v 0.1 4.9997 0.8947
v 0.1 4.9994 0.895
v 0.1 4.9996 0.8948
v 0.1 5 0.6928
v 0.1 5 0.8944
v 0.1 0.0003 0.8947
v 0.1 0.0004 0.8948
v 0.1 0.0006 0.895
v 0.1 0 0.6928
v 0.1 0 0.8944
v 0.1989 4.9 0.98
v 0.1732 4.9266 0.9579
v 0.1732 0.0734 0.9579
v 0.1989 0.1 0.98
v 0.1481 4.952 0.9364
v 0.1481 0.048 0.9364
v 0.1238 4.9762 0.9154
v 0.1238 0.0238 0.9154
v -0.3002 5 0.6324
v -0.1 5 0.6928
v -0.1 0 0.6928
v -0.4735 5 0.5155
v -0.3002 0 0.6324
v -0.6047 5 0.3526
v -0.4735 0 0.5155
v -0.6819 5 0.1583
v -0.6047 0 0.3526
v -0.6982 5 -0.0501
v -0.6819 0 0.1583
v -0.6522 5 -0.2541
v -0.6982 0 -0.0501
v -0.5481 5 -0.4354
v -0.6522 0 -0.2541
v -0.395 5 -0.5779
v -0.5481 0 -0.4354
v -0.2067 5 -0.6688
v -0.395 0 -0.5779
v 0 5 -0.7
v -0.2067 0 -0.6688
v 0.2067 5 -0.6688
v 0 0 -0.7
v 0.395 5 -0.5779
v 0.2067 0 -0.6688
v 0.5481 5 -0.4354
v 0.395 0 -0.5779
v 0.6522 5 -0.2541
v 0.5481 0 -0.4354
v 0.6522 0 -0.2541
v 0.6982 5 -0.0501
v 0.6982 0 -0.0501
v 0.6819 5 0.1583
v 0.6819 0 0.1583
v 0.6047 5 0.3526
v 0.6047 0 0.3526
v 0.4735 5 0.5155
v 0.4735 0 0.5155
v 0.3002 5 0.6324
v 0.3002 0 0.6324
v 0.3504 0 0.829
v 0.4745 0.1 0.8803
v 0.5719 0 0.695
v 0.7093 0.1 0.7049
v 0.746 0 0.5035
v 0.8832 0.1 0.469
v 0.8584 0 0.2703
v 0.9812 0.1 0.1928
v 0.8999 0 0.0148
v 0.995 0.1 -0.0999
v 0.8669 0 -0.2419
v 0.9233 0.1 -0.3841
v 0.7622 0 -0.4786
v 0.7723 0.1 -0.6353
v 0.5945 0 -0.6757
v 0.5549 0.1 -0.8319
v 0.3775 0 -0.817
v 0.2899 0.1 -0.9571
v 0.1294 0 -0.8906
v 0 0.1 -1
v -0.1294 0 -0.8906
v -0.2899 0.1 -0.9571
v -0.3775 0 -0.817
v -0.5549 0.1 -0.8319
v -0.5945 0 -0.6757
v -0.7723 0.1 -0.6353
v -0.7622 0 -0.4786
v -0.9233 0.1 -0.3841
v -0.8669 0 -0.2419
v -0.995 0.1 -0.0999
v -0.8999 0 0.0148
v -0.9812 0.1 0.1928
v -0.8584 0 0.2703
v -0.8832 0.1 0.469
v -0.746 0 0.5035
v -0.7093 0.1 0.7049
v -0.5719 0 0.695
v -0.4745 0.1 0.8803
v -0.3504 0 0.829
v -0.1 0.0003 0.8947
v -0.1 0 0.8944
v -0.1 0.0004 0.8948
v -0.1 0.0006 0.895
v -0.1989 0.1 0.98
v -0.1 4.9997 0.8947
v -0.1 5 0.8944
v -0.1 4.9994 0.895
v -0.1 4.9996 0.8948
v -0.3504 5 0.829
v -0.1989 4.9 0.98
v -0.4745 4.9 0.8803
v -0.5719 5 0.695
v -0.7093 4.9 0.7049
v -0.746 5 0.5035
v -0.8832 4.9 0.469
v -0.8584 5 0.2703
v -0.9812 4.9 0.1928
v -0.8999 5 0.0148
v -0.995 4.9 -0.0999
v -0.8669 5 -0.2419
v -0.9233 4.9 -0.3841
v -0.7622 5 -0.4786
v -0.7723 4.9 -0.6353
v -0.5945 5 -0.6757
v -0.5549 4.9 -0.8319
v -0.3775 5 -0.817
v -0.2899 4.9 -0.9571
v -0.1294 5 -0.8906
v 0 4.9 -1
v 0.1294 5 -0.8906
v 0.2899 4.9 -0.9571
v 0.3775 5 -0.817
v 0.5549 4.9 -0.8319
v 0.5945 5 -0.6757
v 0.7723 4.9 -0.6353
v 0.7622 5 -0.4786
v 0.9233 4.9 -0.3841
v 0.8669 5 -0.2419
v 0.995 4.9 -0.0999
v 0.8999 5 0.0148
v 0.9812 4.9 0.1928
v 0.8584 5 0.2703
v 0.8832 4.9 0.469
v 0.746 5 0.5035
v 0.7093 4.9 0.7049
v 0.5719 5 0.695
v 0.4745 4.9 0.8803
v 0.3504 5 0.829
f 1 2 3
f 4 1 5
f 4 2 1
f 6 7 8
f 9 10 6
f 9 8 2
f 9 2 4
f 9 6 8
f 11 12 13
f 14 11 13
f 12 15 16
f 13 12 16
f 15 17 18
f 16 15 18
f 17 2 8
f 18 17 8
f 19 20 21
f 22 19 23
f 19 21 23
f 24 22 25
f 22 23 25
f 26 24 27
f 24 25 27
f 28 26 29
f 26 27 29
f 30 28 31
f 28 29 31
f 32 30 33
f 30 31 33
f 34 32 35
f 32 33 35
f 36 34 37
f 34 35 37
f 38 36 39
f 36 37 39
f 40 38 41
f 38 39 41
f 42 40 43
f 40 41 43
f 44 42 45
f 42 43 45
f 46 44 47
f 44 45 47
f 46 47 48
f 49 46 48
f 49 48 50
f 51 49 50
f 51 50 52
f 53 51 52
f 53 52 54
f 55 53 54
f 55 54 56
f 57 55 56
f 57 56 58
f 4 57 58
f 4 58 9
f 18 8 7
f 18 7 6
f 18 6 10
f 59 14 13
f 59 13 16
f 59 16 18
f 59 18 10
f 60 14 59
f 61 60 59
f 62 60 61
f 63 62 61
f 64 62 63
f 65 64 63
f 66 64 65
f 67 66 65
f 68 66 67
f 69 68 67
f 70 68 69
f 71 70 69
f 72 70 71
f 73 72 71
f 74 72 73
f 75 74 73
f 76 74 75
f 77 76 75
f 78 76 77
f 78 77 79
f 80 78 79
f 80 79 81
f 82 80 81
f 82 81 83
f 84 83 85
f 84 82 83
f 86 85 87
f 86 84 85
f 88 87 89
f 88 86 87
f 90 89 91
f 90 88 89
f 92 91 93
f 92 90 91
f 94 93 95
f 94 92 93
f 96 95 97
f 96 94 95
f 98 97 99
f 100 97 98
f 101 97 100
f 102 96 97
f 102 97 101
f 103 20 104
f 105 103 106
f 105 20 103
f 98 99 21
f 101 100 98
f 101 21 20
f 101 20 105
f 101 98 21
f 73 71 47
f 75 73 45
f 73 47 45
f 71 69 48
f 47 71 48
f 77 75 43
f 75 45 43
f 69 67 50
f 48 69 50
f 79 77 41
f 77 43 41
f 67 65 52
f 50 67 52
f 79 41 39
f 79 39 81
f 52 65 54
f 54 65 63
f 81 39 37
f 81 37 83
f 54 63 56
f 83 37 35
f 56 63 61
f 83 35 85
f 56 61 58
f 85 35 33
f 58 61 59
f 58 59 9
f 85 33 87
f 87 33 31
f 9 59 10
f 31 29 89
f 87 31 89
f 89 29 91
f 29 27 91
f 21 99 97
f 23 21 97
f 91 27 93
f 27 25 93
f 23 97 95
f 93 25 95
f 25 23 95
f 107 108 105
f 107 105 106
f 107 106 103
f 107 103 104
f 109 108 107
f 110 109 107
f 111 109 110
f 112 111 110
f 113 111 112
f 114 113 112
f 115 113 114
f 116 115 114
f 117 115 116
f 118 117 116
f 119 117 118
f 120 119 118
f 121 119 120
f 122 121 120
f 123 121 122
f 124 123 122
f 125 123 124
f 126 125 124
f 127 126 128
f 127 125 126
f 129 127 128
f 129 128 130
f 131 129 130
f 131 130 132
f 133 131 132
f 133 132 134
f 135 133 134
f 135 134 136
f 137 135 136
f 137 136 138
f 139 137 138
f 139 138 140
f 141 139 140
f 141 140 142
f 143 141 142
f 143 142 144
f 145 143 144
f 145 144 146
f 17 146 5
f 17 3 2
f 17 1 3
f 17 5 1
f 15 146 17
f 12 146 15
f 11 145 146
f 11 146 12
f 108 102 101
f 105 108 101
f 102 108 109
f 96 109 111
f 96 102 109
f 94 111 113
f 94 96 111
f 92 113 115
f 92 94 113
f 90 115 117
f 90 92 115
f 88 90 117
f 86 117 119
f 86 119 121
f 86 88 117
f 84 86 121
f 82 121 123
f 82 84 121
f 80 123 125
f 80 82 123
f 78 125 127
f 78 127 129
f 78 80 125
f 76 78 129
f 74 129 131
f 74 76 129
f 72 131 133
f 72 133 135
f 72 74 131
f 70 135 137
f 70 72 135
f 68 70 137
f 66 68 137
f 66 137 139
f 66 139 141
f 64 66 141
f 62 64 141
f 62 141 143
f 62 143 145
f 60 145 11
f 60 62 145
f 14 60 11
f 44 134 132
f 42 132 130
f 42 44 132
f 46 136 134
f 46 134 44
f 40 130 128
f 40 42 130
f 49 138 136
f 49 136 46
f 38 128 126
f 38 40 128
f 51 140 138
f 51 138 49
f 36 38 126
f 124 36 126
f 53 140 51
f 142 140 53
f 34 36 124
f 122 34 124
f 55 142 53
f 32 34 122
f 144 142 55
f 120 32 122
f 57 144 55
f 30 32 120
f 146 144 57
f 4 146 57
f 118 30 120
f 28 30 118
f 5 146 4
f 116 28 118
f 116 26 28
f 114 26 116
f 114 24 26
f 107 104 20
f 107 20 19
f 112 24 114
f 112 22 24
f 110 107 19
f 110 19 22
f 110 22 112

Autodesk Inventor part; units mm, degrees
ref_plane "YZ Plane" through (0, 0, 0) normal (1, 0, 0) x (0, 1, 0)
ref_plane "XZ Plane" through (0, 0, 0) normal (0, 1, 0) x (-1, 0, 0)
ref_plane "XY Plane" through (0, 0, 0) normal (0, 0, 1) x (1, 0, 0)
sketch "草圖1" plane through (0, 0, 0) normal (0, 1, 0) x (-1, 0, 0)
  circle A0 centre (0, 0) radius 1
  circle A1 centre (0, 0) radius 0.7
  dimension "d0" = 2
  dimension "d1" = 1.4
extrude "擠出1" add sketch "草圖1" along normal blind 5
sketch "草圖2" plane through (0, 0, 0) normal (0, -1, 0) x (1, 0, 0)
  line L0 (-0.1, 1.1657) -> (0.1, 1.1657)
  line L1 (0.1, 1.1657) -> (0.1, 0.5445)
  line L2 (0.1, 0.5445) -> (-0.1, 0.5445)
  line L3 (-0.1, 0.5445) -> (-0.1, 1.1657)
  point P0 (0, 0)
  dimension "d4" = 0.1
  dimension "d5" = 0.2
extrude "擠出2" cut sketch "草圖2" against normal blind 5
chamfer "倒角1" distance 0.1 angle 45 2 edges at (-0.1, 2.5, 0.995) (0.1, 2.5, 0.995)
chamfer "倒角2" distance 0.1 angle 45 2 edges at (0, 0, -1) (0, 5, -1)
properties part number "M2x5彈簧銷"
